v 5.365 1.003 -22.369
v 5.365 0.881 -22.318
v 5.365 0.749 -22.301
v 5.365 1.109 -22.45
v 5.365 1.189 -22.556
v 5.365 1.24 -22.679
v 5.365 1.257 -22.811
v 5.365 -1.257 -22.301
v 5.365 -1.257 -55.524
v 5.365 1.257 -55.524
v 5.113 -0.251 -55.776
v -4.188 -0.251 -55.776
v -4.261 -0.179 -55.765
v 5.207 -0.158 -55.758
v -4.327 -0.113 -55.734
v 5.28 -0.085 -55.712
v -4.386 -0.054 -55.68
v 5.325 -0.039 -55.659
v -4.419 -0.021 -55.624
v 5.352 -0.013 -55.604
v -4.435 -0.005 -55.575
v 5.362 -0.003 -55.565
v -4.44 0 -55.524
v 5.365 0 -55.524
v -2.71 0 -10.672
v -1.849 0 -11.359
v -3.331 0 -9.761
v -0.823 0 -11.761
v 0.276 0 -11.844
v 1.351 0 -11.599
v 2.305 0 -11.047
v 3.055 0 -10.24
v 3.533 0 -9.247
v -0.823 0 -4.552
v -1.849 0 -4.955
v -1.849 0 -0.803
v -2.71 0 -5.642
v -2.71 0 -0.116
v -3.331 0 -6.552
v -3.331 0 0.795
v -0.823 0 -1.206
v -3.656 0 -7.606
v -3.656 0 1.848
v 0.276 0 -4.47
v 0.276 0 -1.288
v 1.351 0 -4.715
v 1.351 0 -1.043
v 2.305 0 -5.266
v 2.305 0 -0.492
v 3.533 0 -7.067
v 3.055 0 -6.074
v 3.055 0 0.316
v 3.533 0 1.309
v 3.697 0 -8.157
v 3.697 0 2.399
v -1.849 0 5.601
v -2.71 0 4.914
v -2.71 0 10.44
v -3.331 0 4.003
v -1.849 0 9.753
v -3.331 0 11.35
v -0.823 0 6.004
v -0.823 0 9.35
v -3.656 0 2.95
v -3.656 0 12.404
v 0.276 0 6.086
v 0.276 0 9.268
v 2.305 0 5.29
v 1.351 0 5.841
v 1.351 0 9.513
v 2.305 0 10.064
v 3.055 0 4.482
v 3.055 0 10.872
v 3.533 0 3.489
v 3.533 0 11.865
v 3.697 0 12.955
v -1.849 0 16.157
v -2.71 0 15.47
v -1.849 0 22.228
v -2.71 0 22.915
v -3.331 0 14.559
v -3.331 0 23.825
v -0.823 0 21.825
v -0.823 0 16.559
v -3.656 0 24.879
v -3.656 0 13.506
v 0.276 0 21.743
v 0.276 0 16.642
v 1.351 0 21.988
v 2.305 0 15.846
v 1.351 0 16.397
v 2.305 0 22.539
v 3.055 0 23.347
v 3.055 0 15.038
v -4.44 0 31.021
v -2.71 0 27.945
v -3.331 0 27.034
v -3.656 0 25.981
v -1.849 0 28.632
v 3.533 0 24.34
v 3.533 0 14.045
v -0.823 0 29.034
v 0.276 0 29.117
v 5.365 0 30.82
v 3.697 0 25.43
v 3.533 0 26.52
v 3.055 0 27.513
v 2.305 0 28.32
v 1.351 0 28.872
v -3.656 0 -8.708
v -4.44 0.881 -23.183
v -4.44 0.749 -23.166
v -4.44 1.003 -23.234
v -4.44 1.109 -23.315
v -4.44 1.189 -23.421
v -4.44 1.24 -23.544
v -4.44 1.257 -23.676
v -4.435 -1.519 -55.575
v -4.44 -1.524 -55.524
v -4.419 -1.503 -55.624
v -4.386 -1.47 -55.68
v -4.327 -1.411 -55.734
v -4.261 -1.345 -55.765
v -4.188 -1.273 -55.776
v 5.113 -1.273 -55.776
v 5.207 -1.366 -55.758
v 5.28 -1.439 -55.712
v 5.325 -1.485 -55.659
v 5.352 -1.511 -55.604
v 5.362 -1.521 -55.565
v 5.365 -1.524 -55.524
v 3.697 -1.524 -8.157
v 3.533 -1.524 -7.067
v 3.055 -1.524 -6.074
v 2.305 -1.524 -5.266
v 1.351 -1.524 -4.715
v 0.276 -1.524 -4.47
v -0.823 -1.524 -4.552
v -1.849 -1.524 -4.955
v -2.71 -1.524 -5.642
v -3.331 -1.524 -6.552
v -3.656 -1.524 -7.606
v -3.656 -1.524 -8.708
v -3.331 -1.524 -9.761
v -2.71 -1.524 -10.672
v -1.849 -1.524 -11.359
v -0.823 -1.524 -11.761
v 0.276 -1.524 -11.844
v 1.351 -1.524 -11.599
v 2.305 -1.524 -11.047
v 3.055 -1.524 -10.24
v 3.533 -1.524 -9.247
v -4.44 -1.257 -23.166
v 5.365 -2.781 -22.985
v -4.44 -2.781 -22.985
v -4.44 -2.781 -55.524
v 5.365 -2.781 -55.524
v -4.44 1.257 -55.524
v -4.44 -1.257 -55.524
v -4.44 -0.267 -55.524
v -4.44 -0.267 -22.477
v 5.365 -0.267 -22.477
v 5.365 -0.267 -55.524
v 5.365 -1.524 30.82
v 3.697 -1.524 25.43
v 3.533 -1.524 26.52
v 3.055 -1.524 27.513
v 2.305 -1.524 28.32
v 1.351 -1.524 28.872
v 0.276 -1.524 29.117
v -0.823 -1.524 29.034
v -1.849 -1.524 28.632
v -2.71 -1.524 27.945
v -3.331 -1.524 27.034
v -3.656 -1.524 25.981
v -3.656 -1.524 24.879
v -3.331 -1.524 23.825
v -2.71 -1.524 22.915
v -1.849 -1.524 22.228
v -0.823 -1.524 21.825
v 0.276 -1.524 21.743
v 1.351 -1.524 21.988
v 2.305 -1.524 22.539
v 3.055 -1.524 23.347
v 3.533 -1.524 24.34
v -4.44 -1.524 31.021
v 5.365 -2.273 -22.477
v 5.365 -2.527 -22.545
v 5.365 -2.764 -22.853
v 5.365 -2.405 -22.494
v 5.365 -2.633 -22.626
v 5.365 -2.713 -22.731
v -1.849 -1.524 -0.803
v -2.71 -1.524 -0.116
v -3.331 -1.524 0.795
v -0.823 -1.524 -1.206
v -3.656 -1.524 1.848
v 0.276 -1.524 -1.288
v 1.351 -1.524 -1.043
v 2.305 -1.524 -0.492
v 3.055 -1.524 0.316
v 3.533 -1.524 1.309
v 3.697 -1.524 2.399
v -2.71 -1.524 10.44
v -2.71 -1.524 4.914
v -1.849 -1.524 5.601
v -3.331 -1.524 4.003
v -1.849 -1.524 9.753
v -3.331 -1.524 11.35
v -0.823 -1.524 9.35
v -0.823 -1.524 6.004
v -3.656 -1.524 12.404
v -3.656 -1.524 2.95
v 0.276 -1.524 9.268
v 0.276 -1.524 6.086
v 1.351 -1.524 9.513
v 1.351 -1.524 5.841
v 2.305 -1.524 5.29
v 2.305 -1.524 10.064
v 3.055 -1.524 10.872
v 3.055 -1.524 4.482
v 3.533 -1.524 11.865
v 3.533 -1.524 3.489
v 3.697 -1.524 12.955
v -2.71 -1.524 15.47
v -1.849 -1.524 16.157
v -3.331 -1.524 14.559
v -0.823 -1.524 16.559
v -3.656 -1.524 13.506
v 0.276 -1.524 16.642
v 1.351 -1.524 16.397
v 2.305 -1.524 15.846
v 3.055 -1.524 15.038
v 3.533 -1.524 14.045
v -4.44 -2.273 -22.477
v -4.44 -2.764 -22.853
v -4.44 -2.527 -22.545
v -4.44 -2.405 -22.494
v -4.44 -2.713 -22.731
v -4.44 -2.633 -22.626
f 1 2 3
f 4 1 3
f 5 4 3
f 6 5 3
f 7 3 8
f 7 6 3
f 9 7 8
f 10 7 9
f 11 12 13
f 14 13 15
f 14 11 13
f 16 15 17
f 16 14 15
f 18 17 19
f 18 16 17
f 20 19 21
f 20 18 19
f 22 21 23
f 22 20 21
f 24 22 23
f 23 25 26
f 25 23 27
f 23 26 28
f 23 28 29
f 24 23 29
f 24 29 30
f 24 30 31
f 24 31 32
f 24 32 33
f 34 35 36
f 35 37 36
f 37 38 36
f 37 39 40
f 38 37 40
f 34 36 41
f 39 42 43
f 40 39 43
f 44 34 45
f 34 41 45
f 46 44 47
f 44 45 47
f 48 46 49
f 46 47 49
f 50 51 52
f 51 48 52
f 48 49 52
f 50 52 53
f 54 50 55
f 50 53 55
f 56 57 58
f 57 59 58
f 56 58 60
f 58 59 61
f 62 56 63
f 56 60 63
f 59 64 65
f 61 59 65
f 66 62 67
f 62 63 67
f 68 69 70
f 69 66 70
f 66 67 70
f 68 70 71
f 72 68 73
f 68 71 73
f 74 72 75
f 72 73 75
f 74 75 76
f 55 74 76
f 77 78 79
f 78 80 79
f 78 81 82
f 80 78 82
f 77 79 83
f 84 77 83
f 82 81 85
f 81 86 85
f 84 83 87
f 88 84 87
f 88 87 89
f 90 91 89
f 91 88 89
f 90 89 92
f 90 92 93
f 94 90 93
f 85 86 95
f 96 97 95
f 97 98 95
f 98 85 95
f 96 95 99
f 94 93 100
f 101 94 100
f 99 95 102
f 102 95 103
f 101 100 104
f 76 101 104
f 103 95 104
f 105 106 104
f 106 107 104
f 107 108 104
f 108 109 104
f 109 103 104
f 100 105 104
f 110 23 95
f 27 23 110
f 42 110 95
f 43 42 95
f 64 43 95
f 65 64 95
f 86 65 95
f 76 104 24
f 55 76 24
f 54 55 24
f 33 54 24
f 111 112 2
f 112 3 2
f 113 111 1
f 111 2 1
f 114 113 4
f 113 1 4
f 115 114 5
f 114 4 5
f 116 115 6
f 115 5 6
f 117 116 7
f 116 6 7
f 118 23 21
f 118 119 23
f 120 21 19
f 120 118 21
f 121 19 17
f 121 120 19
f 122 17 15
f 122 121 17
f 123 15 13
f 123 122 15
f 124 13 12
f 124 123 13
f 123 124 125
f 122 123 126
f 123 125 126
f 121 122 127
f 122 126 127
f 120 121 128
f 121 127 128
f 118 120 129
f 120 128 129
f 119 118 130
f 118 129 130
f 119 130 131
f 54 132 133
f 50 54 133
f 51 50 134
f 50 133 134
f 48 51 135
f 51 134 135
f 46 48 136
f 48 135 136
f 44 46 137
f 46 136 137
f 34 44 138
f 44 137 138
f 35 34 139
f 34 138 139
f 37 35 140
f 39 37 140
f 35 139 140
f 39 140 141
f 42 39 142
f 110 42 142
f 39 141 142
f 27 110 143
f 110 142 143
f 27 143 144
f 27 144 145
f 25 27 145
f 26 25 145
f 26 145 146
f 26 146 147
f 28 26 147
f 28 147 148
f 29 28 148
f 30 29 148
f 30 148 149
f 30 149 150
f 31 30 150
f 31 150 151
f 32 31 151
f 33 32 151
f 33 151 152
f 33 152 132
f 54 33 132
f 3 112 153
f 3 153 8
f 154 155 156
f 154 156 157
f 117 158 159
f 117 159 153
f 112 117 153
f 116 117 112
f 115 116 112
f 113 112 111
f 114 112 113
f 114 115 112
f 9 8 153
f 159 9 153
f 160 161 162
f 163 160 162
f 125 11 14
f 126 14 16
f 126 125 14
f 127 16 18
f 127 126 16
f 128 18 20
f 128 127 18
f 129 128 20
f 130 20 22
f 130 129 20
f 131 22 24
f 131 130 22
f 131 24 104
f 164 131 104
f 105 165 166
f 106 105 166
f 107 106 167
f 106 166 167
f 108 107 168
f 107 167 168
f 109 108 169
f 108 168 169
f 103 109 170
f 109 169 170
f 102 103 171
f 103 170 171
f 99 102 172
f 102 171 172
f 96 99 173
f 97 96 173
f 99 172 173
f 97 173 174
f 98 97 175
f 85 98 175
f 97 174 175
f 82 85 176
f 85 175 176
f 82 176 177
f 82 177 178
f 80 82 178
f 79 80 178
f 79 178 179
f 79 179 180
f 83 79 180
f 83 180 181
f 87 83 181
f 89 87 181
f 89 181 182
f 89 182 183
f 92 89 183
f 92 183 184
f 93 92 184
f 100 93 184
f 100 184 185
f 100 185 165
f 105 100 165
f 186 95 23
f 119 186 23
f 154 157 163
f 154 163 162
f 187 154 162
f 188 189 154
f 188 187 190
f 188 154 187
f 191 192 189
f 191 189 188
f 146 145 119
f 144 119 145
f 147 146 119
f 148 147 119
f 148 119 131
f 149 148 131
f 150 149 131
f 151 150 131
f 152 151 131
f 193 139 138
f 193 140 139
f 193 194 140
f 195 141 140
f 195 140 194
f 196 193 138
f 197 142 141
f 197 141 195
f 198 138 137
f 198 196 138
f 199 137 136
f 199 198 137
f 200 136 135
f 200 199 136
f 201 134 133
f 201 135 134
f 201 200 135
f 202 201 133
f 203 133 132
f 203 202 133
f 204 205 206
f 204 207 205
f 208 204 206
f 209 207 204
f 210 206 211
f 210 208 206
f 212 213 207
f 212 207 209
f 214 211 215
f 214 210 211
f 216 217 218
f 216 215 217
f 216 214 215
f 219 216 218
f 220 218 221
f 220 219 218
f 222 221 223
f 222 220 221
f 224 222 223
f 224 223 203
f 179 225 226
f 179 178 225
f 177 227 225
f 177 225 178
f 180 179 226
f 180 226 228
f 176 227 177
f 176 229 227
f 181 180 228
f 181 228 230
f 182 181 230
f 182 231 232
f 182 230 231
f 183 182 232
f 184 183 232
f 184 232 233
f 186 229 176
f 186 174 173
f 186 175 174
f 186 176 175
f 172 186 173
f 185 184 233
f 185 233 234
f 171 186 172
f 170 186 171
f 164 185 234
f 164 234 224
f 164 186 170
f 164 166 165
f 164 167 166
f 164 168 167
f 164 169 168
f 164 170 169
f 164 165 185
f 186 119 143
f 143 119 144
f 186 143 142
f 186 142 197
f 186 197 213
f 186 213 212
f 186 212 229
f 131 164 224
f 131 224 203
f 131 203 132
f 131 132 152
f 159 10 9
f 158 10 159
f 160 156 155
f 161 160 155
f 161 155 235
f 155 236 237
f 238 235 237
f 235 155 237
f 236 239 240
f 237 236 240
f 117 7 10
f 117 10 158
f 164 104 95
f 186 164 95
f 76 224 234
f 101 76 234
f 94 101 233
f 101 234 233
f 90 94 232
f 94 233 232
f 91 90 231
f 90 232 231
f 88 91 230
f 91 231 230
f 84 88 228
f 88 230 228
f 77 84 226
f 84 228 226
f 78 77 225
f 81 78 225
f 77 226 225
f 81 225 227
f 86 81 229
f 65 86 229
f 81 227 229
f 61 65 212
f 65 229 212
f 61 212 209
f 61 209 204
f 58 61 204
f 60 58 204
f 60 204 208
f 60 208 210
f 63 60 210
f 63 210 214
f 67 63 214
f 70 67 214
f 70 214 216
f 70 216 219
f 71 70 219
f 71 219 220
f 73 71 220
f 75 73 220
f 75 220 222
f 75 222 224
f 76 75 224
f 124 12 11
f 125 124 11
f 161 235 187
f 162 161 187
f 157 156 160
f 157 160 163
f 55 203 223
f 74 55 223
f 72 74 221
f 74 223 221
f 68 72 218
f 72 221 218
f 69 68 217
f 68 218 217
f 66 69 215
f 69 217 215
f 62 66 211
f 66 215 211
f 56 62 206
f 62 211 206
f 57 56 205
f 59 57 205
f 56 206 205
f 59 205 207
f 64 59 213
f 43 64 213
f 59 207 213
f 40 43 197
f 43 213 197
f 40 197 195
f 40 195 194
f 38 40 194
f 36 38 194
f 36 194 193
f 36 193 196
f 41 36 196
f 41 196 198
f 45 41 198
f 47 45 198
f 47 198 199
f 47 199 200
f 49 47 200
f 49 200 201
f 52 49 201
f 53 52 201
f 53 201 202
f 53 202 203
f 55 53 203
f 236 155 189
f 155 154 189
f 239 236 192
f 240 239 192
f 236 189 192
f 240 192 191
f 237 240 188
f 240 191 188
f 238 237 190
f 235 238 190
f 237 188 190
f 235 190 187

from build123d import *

# Parameters (mm, degrees)
F1_DEPTH = 1.524
F2_R     = 0.25146
F3_R     = 3.6974622631
F4_DEPTH = 1.525
F5_W     = 9.8046935163
F5_H     = 33.0474999556
F6_DEPTH = 1.2573
F7_R     = 0.508
F9_DEPTH = 1.2573
F10_R    = 0.508


with BuildPart() as f1:
    # F0 (on Front) → F1 (new body)
    with BuildSketch(Plane.XZ):
        Polygon((5.364832934, 30.8204153117), (-4.4398605824, 31.0205110515), (-4.4398605824, -55.775757879), (5.364832934, -55.775757879), align=None)
    extrude(amount=F1_DEPTH)

    # F2
    f2_edges = [f1.edges().sort_by_distance(p)[0] for p in [
        (-4.439861, -0.762, -55.775758),
        (5.364833, -0.762, -55.775758),
        (0.462486, 0, -55.775758),
        (0.462486, -1.524, -55.775758),
    ]]
    fillet(f2_edges, radius=F2_R)

    # F3 (on face) → F4 (cut, through all)
    with BuildSketch(Plane.XZ.offset(1.524)):
        with Locations((0, 25.429655737)):
            Circle(F3_R)
        with Locations((0, 12.9547312109)):
            Circle(F3_R)
        with Locations((0, 2.3990240031)):
            Circle(F3_R)
        with Locations((0, -8.1566817554)):
            Circle(F3_R)
    extrude(amount=-F4_DEPTH, mode=Mode.SUBTRACT)


with BuildPart() as f6:
    # F5 (on face) → F6 (new body, symmetric)
    with BuildSketch(Plane.XZ.offset(1.524)):
        with Locations((0.4624861758, -39.0005479012)):
            Rectangle(F5_W, F5_H)
    extrude(amount=F6_DEPTH, both=True)

    # F7
    f7_edges = [f6.edges().sort_by_distance(p)[0] for p in [
        (0.462486, -2.7813, -22.476798),
    ]]
    fillet(f7_edges, radius=F7_R)


with BuildPart() as f9:
    # F8 (on face) → F9 (new body, symmetric)
    with BuildSketch(Plane(origin=(0, 0, 0), x_dir=(-1, 0, 0), z_dir=(0, 1, 0))):
        Polygon((4.4398605824, -23.1657922268), (-5.364832934, -22.3010331392), (-5.364832934, -55.524297879), (4.4398605824, -55.524297879), align=None)
    extrude(amount=F9_DEPTH, both=True)

    # F10
    f10_edges = [f9.edges().sort_by_distance(p)[0] for p in [
        (0.462486, 1.2573, -22.733413),
    ]]
    fillet(f10_edges, radius=F10_R)


solid = Compound([f1.part, f6.part, f9.part])
